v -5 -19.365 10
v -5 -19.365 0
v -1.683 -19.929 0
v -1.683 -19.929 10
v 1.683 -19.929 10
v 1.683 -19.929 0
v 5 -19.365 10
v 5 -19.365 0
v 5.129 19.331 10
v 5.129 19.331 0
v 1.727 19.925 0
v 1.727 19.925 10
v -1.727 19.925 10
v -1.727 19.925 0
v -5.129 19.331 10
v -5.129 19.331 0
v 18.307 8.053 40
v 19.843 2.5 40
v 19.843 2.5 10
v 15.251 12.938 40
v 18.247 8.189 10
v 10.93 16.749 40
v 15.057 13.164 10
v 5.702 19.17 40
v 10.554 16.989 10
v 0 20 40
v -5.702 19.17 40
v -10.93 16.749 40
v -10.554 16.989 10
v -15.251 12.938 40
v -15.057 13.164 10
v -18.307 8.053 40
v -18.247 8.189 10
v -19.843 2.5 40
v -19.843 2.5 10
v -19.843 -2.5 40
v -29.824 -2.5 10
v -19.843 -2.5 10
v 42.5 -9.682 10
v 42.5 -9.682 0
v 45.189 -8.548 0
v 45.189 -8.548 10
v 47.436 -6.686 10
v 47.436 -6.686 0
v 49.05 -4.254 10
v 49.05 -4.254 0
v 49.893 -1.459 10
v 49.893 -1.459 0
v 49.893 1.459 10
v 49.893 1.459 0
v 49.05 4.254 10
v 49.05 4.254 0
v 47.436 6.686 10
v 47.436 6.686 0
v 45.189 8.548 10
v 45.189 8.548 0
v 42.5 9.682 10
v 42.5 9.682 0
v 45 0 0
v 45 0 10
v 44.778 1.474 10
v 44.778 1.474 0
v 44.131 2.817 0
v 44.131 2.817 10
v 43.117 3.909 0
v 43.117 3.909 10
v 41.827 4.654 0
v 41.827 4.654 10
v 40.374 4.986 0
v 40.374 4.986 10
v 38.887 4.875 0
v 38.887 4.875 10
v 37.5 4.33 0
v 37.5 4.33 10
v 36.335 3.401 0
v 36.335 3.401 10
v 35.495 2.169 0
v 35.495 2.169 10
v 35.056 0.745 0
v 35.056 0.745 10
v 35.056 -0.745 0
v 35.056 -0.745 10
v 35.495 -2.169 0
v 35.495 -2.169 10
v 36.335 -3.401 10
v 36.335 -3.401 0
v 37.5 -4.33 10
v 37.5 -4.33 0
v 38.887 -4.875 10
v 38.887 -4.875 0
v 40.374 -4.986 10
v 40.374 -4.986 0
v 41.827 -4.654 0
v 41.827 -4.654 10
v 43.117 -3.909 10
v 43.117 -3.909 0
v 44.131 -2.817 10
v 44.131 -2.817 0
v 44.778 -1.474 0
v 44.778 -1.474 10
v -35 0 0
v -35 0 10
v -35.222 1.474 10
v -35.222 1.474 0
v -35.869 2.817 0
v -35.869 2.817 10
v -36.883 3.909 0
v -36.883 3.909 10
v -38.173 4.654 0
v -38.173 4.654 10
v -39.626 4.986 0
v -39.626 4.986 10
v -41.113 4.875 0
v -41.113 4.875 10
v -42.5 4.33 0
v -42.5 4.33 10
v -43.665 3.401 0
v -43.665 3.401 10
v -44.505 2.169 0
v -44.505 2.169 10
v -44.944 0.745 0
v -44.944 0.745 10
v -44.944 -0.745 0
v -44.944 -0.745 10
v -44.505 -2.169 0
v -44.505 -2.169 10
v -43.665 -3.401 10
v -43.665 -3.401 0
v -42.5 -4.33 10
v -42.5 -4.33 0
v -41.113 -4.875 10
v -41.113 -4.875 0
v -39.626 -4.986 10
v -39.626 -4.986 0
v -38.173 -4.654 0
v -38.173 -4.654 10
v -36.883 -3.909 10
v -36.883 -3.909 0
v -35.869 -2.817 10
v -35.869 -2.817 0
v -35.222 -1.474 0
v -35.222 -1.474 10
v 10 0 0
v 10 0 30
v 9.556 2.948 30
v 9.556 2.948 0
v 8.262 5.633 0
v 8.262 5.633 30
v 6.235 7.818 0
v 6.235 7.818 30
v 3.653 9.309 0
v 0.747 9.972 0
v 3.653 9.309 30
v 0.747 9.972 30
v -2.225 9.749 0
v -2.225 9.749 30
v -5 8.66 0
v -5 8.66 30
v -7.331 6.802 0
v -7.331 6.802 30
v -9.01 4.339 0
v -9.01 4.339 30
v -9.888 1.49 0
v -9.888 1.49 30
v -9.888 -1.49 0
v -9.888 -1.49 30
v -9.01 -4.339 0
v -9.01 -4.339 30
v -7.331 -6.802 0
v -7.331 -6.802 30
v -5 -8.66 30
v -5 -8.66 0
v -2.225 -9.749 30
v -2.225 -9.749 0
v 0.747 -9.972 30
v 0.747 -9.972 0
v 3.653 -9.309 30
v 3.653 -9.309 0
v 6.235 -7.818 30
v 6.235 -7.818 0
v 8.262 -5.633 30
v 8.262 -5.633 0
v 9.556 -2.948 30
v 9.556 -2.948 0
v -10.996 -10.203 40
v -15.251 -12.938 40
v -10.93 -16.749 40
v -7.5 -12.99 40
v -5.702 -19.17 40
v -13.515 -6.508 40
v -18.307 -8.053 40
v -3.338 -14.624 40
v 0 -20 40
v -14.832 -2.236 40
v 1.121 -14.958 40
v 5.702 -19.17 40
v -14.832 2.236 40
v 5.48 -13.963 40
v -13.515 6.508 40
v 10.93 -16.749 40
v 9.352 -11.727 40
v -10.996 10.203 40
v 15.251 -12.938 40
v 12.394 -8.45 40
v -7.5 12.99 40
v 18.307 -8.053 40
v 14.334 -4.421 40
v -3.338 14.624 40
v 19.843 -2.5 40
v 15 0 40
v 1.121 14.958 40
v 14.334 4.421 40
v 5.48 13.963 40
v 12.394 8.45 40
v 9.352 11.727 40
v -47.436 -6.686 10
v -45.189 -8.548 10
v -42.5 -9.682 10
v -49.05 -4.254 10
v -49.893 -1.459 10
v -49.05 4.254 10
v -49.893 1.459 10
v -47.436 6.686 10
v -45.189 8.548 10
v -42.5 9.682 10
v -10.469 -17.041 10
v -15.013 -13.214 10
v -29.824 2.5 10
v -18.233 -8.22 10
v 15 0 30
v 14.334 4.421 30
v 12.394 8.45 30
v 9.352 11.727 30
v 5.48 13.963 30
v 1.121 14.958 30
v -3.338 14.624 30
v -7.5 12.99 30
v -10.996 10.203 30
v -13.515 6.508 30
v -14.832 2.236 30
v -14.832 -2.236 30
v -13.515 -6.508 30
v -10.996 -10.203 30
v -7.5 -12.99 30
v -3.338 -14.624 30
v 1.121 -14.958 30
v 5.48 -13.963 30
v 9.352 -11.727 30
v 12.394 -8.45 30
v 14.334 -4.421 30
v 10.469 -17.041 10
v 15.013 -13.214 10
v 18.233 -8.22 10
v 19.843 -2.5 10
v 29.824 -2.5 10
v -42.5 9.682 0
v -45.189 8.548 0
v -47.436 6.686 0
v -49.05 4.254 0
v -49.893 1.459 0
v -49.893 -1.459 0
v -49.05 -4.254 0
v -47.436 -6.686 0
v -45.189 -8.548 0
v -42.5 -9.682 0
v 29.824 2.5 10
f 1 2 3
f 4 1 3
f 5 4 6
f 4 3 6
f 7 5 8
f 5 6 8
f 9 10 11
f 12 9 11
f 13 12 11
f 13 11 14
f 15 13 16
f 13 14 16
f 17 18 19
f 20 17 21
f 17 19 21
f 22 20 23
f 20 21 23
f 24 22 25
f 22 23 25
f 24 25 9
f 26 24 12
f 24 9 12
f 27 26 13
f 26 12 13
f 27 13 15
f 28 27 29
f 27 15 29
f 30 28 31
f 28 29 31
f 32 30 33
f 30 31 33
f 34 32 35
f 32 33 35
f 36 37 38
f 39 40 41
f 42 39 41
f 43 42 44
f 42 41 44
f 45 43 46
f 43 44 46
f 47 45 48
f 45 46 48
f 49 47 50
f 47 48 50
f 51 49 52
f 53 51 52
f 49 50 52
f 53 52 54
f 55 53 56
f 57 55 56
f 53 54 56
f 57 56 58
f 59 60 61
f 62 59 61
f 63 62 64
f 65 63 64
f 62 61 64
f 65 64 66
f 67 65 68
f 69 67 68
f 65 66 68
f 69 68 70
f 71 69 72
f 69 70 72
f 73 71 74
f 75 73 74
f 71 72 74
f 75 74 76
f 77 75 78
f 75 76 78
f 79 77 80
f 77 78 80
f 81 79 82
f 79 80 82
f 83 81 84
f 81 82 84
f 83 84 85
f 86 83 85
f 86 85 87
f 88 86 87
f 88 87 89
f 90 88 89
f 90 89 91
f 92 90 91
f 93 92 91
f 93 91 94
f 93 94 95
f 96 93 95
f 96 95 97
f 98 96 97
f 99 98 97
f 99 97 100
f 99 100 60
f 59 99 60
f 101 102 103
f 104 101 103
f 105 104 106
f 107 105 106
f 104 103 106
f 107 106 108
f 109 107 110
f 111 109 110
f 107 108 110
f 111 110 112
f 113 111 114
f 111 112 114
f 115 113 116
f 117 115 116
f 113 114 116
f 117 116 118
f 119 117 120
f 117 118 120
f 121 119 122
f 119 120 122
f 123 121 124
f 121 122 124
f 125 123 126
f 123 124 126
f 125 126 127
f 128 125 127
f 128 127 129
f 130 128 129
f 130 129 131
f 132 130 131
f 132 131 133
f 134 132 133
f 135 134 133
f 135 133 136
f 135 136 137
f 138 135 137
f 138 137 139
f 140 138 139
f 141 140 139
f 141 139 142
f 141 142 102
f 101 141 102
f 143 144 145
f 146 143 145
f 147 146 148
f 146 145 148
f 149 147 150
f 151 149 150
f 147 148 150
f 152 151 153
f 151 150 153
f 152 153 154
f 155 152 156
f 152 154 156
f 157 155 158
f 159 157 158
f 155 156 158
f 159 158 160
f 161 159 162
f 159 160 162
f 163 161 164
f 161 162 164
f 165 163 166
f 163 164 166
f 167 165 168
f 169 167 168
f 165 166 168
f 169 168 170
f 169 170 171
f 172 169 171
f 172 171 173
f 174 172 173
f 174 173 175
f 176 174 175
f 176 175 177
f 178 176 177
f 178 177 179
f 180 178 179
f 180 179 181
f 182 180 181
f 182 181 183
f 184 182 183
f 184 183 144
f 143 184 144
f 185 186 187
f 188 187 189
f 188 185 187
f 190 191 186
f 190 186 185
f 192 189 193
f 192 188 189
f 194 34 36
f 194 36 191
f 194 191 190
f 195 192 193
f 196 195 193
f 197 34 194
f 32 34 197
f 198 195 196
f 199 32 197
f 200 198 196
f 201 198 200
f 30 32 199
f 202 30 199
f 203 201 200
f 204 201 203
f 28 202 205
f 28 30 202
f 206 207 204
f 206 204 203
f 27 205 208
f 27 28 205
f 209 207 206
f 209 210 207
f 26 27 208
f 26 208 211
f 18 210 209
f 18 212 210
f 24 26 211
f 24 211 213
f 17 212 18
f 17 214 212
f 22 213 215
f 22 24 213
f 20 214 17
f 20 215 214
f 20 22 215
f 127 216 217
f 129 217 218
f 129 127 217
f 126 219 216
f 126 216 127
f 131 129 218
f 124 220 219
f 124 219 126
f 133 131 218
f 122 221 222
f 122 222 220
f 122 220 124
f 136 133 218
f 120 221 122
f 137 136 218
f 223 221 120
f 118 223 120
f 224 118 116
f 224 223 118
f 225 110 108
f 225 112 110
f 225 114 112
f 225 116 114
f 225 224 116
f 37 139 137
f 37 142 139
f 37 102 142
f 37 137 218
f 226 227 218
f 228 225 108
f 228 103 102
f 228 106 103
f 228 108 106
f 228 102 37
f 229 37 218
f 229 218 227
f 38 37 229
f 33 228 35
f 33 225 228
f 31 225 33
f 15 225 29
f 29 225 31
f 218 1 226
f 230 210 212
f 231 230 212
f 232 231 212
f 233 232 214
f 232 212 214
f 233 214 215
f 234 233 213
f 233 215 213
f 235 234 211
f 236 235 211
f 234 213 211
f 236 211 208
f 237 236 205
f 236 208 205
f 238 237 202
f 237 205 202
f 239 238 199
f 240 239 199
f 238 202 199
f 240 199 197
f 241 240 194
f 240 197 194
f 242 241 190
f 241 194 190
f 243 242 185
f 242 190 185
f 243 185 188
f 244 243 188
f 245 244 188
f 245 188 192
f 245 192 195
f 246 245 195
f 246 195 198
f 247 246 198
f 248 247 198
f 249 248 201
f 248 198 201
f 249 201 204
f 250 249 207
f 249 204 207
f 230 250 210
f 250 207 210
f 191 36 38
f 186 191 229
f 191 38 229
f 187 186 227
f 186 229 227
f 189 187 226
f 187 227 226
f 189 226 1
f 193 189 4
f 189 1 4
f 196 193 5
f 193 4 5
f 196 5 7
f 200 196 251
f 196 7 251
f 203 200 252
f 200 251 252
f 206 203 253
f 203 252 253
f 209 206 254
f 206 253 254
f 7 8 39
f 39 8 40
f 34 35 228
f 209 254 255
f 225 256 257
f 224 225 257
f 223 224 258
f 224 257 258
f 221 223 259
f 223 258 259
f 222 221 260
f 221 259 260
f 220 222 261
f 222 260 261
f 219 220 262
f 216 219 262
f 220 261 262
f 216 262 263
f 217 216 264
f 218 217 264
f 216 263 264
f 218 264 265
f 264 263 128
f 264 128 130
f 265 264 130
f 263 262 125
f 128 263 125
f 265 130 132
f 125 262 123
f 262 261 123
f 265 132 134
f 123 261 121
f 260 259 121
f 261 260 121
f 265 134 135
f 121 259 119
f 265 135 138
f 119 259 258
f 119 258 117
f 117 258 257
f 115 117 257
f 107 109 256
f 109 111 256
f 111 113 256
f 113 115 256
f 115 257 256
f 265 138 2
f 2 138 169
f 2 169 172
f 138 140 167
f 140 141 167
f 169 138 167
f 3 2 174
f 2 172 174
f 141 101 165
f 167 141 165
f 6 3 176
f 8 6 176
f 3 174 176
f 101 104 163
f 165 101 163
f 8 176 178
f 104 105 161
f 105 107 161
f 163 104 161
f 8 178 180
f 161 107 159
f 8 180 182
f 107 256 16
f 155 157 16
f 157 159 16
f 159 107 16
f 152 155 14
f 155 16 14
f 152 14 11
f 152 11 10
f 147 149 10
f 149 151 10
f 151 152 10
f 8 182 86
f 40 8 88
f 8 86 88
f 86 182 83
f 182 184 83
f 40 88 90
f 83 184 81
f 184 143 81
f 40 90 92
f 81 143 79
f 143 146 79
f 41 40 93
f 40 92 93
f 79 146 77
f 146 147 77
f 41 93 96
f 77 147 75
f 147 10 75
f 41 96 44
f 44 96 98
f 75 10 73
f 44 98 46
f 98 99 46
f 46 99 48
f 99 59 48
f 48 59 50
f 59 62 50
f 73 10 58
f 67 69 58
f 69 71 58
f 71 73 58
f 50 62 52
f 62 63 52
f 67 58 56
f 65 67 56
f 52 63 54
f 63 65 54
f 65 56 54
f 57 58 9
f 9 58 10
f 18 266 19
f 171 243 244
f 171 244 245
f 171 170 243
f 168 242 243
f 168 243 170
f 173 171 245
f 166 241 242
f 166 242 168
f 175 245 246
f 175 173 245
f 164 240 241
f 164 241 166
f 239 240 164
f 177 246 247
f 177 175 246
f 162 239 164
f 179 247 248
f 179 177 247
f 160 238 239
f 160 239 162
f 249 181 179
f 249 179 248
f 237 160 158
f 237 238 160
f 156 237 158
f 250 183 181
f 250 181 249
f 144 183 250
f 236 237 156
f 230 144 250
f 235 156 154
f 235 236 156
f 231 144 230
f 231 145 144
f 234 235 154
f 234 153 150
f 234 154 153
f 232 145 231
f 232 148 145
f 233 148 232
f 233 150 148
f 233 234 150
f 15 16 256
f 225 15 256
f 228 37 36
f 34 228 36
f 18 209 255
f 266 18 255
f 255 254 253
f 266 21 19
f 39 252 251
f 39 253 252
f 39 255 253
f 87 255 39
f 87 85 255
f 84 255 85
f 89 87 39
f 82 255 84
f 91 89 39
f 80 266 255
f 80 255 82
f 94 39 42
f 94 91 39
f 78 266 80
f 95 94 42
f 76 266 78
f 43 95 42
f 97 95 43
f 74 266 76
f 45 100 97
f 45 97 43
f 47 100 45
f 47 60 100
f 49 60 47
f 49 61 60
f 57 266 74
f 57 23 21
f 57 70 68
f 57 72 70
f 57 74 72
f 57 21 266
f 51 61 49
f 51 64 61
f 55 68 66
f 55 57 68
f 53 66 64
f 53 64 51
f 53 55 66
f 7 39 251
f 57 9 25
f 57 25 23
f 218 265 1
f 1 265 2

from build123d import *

# Parameters (mm, degrees)
F1_DEPTH  = 10
F2_R      = 5
F3_DEPTH  = 10.001
F4_R      = 20
F5_DEPTH  = 30
F6_R      = 15
F7_DEPTH  = 10
F8_R      = 10
F9_DEPTH  = 30.001
F12_DEPTH = 30
F14_DEPTH = 22.501


with BuildPart() as f1:
    # F0 (on Top) → F1 (new body)
    with BuildSketch(Plane.XY):
        with BuildLine():
            Line((-42.4998887826, -9.6824870811), (-5.0000000003, -19.364916731))
            ThreePointArc((-5.0000000003, -19.364916731), (0, -20), (5.0000000003, -19.364916731))
            Line((5.0000000003, -19.364916731), (42.4998887826, -9.6824870811))
            ThreePointArc((42.4998887826, -9.6824870811), (50, 0), (42.4998887826, 9.6824870811))
            Line((42.4998887826, 9.6824870811), (5.128827219, 19.3311958077))
            ThreePointArc((5.128827219, 19.3311958077), (0, 20), (-5.128827219, 19.3311958077))
            Line((-5.128827219, 19.3311958077), (-42.4998887826, 9.6824870811))
            ThreePointArc((-42.4998887826, 9.6824870811), (-50, 0), (-42.4998887826, -9.6824870811))
        make_face()
    extrude(amount=F1_DEPTH)

    # F2 (on face) → F3 (cut, through all)
    with BuildSketch(Plane.XY.offset(10)):
        with Locations((-40, 0)):
            Circle(F2_R)
        with Locations((40, 0)):
            Circle(F2_R)
    extrude(amount=-F3_DEPTH, mode=Mode.SUBTRACT)

    # F4 (on face) → F5 (join)
    with BuildSketch(Plane.XY.offset(10)):
        Circle(F4_R)
    extrude(amount=F5_DEPTH)

    # F6 (on face) → F7 (cut)
    with BuildSketch(Plane.XY.offset(40)):
        Circle(F6_R)
    extrude(amount=-F7_DEPTH, mode=Mode.SUBTRACT)

    # F8 (on face) → F9 (cut, through all)
    with BuildSketch(Plane.XY.offset(30)):
        Circle(F8_R)
    extrude(amount=-F9_DEPTH, mode=Mode.SUBTRACT)

    # F11 (on offset) → F12 (join)
    with BuildSketch(Plane.XY.offset(10)):
        Polygon((-19.8240634054, -2.5), (-19.8240634054, 0), (-19.8240634054, 2.5), (-29.8240634054, 2.5), (-29.8240634054, 0), (-29.8240634054, -2.5), align=None)
        Polygon((29.8240634054, 2.5), (19.8240634054, 2.5), (19.8240634054, 0), (19.8240634054, -2.5), (29.8240634054, -2.5), (29.8240634054, 0), align=None)
    extrude(amount=F12_DEPTH)

    # F13 (on face) → F14 (cut, through all)
    with BuildSketch(Plane.XZ.offset(2.5)):
        Polygon((-29.8240634054, 40), (-29.8240634054, 10), (-19.843134833, 40), align=None)
        Polygon((19.843134833, 40), (29.8240634054, 10), (29.8240634054, 40), align=None)
    extrude(amount=-F14_DEPTH, mode=Mode.SUBTRACT)


solid = f1.part
